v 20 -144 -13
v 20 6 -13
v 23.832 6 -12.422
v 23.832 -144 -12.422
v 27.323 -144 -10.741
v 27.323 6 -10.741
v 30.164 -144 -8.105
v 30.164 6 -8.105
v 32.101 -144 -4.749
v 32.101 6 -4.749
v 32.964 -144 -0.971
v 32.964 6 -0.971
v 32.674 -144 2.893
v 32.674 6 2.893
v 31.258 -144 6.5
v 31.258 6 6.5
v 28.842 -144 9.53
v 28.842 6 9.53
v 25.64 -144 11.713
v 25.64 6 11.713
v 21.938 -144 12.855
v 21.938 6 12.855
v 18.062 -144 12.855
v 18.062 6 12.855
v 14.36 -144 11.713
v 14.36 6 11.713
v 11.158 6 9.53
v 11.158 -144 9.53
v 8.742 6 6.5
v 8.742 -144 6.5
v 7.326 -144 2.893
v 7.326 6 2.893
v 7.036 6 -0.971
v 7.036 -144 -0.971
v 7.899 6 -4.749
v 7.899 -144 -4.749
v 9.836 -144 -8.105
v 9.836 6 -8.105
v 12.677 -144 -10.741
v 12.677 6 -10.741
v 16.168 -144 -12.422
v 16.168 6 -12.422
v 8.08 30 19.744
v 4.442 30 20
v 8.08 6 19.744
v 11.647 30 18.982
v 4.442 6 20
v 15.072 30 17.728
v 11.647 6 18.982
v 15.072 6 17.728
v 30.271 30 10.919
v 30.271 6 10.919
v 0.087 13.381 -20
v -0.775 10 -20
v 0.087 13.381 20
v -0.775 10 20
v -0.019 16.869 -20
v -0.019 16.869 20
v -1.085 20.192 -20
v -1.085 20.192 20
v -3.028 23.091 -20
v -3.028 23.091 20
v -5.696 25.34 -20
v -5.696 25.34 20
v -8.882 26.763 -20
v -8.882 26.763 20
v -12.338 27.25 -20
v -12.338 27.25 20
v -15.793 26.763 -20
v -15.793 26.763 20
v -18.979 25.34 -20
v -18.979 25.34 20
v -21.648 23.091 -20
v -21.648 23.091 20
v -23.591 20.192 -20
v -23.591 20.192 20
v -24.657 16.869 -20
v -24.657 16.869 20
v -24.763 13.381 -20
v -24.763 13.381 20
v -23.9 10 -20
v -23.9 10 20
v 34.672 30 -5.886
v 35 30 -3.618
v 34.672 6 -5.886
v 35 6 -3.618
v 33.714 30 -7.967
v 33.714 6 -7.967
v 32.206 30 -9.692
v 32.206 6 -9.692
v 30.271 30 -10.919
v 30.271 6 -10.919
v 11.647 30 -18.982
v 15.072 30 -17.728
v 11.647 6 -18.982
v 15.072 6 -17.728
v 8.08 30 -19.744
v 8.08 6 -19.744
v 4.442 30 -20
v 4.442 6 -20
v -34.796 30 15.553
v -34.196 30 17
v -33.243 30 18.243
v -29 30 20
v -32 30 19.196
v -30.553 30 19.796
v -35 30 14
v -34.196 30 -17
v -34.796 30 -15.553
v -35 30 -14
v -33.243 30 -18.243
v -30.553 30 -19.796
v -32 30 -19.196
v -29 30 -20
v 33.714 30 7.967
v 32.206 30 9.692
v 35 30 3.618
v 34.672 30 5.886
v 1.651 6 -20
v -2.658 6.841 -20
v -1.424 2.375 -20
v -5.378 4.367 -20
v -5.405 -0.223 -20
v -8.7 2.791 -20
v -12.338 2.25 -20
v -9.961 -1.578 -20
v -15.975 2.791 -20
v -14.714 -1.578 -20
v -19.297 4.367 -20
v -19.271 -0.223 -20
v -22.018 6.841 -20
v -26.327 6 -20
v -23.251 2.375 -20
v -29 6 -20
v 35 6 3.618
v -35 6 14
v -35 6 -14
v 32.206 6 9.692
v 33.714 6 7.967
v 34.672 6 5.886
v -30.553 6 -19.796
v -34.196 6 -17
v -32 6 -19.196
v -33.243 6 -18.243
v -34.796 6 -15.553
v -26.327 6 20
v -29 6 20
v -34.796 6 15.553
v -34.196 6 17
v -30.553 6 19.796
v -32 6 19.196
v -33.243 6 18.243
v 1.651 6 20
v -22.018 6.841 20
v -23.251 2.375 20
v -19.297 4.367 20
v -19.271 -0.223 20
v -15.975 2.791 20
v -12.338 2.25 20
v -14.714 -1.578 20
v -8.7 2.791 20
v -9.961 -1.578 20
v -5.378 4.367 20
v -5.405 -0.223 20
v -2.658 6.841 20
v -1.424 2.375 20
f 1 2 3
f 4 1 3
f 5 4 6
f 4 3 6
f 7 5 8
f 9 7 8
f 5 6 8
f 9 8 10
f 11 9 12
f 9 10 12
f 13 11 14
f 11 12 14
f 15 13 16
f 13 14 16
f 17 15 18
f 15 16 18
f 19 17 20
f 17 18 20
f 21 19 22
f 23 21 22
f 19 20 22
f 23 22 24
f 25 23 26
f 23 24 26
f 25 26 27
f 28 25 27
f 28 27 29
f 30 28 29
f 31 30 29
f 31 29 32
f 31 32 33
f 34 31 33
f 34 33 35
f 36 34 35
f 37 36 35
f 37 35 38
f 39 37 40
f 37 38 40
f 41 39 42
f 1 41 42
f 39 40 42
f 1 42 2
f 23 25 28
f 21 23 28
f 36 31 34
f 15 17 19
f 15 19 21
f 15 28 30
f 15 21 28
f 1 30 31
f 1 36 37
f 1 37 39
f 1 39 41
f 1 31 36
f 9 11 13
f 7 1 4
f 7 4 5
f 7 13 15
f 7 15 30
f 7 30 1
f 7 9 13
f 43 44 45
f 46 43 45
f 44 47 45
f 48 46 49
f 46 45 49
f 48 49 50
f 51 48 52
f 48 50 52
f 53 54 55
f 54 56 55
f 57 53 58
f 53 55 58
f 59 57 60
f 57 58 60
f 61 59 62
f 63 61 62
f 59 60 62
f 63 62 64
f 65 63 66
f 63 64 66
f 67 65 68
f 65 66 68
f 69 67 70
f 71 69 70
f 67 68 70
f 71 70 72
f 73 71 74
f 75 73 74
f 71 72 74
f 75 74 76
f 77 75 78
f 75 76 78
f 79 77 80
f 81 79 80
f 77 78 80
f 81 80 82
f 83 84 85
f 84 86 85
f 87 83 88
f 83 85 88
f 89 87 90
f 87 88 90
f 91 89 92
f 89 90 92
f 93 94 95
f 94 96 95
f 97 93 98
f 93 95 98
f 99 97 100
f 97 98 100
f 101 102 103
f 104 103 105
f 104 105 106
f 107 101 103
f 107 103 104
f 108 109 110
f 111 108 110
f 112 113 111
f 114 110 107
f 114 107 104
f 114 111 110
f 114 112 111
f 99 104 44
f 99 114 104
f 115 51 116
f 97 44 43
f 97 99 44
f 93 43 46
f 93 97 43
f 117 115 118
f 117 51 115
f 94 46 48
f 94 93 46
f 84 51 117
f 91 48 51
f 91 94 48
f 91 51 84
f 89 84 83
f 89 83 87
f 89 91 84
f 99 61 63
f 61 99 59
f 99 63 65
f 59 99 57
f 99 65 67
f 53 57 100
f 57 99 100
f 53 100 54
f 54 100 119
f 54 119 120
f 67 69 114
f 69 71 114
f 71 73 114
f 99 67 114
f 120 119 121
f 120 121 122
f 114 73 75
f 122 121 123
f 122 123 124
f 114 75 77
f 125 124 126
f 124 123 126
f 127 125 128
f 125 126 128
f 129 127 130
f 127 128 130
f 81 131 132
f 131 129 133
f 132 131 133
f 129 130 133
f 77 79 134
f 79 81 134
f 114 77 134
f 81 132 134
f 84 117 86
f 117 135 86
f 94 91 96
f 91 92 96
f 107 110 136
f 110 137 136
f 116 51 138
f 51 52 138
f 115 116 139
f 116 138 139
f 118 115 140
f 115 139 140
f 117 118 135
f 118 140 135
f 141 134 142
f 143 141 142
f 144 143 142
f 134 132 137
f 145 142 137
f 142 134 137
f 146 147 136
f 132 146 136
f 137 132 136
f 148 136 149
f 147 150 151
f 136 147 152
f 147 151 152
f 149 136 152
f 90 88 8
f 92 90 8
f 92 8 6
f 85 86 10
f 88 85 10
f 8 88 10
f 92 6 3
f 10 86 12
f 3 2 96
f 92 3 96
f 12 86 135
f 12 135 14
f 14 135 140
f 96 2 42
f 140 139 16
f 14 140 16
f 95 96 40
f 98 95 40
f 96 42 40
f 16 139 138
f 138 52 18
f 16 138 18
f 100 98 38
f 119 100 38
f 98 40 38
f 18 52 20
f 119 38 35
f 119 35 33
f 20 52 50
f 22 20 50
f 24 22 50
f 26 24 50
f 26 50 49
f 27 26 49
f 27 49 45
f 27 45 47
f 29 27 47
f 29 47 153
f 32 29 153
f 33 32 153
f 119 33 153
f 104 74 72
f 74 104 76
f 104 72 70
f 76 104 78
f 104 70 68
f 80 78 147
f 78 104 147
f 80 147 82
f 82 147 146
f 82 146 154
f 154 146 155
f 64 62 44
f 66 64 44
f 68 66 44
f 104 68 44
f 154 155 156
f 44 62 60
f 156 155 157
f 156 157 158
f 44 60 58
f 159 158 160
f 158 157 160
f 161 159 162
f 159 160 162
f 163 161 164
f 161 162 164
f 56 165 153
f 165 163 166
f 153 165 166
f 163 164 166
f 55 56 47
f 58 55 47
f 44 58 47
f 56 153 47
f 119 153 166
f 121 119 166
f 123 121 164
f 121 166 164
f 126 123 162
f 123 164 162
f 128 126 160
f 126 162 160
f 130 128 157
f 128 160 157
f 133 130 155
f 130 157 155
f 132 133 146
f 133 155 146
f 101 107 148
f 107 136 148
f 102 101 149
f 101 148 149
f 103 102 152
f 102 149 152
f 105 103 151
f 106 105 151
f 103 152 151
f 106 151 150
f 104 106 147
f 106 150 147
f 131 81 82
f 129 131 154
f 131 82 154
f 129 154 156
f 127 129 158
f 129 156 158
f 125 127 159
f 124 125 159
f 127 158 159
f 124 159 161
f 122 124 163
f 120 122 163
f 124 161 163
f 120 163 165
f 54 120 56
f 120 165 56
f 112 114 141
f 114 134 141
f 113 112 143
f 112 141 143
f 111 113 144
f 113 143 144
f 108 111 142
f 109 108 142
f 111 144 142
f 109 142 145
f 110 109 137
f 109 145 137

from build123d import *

# Parameters (mm, degrees)
BOSS_EXTRUDE1_DEPTH = 10
SKETCH2_OUTSIDE_W   = 88.614
SKETCH2_OUTSIDE_H   = 38.614
CUT_EXTRUDE1_DEPTH  = 55.083269132
SKETCH3_R           = 13
BOSS_EXTRUDE2_DEPTH = 150
SKETCH15_R          = 12.5
CUT_EXTRUDE2_DEPTH  = 154.495928285


with BuildPart() as part:
    # Sketch1 → Boss-Extrude1 (new, symmetric)
    with BuildSketch(Plane(origin=(0, 0, 0), x_dir=(1, 0, 0), z_dir=(0, 1, 0))):
        with BuildLine():
            Line((4.442128661, 20), (-29, 20))
            ThreePointArc((-29, 20), (-33.242640687, 18.242640687), (-35, 14))
            Line((-35, 14), (-35, -14))
            ThreePointArc((-35, -14), (-33.242640687, -18.242640687), (-29, -20))
            Line((-29, -20), (4.442128661, -20))
            ThreePointArc((4.442128661, -20), (9.877208627, -19.42557582), (15.072131567, -17.727685058))
            Line((15.072131567, -17.727685058), (30.270770125, -10.918694984))
            ThreePointArc((30.270770125, -10.918694984), (33.714393532, -7.967227328), (35, -3.617868812))
            Line((35, -3.617868812), (35, 3.617868812))
            ThreePointArc((35, 3.617868812), (33.714393532, 7.967227328), (30.270770125, 10.918694984))
            Line((30.270770125, 10.918694984), (15.072131567, 17.727685058))
            ThreePointArc((15.072131567, 17.727685058), (9.877208627, 19.42557582), (4.442128661, 20))
        make_face()
    boss_extrude1 = extrude(amount=BOSS_EXTRUDE1_DEPTH, both=True)

    # Sketch2 outside → Cut-Extrude1 (cut, through all)
    with BuildSketch(Plane.XY.offset(20)):
        Rectangle(SKETCH2_OUTSIDE_W, SKETCH2_OUTSIDE_H)
        with BuildLine():
            Line((-35, 10), (-23.9, 10))
            ThreePointArc((-23.9, 10), (-12.33766892, 2.25), (-0.77533784, 10))
            Line((-0.77533784, 10), (35, 10))
            Line((35, 10), (35, 6))
            Line((35, 6), (1.651165913, 6))
            ThreePointArc((1.651165913, 6), (-12.33766892, -1.75), (-26.326503754, 6))
            Line((-26.326503754, 6), (-35, 6))
            Line((-35, 6), (-35, 10))
        make_face(mode=Mode.SUBTRACT)
    extrude(amount=-CUT_EXTRUDE1_DEPTH, mode=Mode.SUBTRACT)

    # Sketch3 → Boss-Extrude2 (add)
    with BuildSketch(Plane.XZ.offset(-6)):
        with Locations(Location((20, 0, 0), (0, 0, 270))):
            Circle(SKETCH3_R)
    extrude(amount=BOSS_EXTRUDE2_DEPTH)

    # Mirror1: Boss-Extrude1 across plane
    add(boss_extrude1.mirror(Plane.ZX.offset(10)))

    # Sketch15 → Cut-Extrude2 (cut, through all)
    with BuildSketch(Plane.XY.offset(20)):
        with Locations((-12.33766892, 14.75)):
            Circle(SKETCH15_R)
    extrude(amount=-CUT_EXTRUDE2_DEPTH, mode=Mode.SUBTRACT)


solid = part.part
